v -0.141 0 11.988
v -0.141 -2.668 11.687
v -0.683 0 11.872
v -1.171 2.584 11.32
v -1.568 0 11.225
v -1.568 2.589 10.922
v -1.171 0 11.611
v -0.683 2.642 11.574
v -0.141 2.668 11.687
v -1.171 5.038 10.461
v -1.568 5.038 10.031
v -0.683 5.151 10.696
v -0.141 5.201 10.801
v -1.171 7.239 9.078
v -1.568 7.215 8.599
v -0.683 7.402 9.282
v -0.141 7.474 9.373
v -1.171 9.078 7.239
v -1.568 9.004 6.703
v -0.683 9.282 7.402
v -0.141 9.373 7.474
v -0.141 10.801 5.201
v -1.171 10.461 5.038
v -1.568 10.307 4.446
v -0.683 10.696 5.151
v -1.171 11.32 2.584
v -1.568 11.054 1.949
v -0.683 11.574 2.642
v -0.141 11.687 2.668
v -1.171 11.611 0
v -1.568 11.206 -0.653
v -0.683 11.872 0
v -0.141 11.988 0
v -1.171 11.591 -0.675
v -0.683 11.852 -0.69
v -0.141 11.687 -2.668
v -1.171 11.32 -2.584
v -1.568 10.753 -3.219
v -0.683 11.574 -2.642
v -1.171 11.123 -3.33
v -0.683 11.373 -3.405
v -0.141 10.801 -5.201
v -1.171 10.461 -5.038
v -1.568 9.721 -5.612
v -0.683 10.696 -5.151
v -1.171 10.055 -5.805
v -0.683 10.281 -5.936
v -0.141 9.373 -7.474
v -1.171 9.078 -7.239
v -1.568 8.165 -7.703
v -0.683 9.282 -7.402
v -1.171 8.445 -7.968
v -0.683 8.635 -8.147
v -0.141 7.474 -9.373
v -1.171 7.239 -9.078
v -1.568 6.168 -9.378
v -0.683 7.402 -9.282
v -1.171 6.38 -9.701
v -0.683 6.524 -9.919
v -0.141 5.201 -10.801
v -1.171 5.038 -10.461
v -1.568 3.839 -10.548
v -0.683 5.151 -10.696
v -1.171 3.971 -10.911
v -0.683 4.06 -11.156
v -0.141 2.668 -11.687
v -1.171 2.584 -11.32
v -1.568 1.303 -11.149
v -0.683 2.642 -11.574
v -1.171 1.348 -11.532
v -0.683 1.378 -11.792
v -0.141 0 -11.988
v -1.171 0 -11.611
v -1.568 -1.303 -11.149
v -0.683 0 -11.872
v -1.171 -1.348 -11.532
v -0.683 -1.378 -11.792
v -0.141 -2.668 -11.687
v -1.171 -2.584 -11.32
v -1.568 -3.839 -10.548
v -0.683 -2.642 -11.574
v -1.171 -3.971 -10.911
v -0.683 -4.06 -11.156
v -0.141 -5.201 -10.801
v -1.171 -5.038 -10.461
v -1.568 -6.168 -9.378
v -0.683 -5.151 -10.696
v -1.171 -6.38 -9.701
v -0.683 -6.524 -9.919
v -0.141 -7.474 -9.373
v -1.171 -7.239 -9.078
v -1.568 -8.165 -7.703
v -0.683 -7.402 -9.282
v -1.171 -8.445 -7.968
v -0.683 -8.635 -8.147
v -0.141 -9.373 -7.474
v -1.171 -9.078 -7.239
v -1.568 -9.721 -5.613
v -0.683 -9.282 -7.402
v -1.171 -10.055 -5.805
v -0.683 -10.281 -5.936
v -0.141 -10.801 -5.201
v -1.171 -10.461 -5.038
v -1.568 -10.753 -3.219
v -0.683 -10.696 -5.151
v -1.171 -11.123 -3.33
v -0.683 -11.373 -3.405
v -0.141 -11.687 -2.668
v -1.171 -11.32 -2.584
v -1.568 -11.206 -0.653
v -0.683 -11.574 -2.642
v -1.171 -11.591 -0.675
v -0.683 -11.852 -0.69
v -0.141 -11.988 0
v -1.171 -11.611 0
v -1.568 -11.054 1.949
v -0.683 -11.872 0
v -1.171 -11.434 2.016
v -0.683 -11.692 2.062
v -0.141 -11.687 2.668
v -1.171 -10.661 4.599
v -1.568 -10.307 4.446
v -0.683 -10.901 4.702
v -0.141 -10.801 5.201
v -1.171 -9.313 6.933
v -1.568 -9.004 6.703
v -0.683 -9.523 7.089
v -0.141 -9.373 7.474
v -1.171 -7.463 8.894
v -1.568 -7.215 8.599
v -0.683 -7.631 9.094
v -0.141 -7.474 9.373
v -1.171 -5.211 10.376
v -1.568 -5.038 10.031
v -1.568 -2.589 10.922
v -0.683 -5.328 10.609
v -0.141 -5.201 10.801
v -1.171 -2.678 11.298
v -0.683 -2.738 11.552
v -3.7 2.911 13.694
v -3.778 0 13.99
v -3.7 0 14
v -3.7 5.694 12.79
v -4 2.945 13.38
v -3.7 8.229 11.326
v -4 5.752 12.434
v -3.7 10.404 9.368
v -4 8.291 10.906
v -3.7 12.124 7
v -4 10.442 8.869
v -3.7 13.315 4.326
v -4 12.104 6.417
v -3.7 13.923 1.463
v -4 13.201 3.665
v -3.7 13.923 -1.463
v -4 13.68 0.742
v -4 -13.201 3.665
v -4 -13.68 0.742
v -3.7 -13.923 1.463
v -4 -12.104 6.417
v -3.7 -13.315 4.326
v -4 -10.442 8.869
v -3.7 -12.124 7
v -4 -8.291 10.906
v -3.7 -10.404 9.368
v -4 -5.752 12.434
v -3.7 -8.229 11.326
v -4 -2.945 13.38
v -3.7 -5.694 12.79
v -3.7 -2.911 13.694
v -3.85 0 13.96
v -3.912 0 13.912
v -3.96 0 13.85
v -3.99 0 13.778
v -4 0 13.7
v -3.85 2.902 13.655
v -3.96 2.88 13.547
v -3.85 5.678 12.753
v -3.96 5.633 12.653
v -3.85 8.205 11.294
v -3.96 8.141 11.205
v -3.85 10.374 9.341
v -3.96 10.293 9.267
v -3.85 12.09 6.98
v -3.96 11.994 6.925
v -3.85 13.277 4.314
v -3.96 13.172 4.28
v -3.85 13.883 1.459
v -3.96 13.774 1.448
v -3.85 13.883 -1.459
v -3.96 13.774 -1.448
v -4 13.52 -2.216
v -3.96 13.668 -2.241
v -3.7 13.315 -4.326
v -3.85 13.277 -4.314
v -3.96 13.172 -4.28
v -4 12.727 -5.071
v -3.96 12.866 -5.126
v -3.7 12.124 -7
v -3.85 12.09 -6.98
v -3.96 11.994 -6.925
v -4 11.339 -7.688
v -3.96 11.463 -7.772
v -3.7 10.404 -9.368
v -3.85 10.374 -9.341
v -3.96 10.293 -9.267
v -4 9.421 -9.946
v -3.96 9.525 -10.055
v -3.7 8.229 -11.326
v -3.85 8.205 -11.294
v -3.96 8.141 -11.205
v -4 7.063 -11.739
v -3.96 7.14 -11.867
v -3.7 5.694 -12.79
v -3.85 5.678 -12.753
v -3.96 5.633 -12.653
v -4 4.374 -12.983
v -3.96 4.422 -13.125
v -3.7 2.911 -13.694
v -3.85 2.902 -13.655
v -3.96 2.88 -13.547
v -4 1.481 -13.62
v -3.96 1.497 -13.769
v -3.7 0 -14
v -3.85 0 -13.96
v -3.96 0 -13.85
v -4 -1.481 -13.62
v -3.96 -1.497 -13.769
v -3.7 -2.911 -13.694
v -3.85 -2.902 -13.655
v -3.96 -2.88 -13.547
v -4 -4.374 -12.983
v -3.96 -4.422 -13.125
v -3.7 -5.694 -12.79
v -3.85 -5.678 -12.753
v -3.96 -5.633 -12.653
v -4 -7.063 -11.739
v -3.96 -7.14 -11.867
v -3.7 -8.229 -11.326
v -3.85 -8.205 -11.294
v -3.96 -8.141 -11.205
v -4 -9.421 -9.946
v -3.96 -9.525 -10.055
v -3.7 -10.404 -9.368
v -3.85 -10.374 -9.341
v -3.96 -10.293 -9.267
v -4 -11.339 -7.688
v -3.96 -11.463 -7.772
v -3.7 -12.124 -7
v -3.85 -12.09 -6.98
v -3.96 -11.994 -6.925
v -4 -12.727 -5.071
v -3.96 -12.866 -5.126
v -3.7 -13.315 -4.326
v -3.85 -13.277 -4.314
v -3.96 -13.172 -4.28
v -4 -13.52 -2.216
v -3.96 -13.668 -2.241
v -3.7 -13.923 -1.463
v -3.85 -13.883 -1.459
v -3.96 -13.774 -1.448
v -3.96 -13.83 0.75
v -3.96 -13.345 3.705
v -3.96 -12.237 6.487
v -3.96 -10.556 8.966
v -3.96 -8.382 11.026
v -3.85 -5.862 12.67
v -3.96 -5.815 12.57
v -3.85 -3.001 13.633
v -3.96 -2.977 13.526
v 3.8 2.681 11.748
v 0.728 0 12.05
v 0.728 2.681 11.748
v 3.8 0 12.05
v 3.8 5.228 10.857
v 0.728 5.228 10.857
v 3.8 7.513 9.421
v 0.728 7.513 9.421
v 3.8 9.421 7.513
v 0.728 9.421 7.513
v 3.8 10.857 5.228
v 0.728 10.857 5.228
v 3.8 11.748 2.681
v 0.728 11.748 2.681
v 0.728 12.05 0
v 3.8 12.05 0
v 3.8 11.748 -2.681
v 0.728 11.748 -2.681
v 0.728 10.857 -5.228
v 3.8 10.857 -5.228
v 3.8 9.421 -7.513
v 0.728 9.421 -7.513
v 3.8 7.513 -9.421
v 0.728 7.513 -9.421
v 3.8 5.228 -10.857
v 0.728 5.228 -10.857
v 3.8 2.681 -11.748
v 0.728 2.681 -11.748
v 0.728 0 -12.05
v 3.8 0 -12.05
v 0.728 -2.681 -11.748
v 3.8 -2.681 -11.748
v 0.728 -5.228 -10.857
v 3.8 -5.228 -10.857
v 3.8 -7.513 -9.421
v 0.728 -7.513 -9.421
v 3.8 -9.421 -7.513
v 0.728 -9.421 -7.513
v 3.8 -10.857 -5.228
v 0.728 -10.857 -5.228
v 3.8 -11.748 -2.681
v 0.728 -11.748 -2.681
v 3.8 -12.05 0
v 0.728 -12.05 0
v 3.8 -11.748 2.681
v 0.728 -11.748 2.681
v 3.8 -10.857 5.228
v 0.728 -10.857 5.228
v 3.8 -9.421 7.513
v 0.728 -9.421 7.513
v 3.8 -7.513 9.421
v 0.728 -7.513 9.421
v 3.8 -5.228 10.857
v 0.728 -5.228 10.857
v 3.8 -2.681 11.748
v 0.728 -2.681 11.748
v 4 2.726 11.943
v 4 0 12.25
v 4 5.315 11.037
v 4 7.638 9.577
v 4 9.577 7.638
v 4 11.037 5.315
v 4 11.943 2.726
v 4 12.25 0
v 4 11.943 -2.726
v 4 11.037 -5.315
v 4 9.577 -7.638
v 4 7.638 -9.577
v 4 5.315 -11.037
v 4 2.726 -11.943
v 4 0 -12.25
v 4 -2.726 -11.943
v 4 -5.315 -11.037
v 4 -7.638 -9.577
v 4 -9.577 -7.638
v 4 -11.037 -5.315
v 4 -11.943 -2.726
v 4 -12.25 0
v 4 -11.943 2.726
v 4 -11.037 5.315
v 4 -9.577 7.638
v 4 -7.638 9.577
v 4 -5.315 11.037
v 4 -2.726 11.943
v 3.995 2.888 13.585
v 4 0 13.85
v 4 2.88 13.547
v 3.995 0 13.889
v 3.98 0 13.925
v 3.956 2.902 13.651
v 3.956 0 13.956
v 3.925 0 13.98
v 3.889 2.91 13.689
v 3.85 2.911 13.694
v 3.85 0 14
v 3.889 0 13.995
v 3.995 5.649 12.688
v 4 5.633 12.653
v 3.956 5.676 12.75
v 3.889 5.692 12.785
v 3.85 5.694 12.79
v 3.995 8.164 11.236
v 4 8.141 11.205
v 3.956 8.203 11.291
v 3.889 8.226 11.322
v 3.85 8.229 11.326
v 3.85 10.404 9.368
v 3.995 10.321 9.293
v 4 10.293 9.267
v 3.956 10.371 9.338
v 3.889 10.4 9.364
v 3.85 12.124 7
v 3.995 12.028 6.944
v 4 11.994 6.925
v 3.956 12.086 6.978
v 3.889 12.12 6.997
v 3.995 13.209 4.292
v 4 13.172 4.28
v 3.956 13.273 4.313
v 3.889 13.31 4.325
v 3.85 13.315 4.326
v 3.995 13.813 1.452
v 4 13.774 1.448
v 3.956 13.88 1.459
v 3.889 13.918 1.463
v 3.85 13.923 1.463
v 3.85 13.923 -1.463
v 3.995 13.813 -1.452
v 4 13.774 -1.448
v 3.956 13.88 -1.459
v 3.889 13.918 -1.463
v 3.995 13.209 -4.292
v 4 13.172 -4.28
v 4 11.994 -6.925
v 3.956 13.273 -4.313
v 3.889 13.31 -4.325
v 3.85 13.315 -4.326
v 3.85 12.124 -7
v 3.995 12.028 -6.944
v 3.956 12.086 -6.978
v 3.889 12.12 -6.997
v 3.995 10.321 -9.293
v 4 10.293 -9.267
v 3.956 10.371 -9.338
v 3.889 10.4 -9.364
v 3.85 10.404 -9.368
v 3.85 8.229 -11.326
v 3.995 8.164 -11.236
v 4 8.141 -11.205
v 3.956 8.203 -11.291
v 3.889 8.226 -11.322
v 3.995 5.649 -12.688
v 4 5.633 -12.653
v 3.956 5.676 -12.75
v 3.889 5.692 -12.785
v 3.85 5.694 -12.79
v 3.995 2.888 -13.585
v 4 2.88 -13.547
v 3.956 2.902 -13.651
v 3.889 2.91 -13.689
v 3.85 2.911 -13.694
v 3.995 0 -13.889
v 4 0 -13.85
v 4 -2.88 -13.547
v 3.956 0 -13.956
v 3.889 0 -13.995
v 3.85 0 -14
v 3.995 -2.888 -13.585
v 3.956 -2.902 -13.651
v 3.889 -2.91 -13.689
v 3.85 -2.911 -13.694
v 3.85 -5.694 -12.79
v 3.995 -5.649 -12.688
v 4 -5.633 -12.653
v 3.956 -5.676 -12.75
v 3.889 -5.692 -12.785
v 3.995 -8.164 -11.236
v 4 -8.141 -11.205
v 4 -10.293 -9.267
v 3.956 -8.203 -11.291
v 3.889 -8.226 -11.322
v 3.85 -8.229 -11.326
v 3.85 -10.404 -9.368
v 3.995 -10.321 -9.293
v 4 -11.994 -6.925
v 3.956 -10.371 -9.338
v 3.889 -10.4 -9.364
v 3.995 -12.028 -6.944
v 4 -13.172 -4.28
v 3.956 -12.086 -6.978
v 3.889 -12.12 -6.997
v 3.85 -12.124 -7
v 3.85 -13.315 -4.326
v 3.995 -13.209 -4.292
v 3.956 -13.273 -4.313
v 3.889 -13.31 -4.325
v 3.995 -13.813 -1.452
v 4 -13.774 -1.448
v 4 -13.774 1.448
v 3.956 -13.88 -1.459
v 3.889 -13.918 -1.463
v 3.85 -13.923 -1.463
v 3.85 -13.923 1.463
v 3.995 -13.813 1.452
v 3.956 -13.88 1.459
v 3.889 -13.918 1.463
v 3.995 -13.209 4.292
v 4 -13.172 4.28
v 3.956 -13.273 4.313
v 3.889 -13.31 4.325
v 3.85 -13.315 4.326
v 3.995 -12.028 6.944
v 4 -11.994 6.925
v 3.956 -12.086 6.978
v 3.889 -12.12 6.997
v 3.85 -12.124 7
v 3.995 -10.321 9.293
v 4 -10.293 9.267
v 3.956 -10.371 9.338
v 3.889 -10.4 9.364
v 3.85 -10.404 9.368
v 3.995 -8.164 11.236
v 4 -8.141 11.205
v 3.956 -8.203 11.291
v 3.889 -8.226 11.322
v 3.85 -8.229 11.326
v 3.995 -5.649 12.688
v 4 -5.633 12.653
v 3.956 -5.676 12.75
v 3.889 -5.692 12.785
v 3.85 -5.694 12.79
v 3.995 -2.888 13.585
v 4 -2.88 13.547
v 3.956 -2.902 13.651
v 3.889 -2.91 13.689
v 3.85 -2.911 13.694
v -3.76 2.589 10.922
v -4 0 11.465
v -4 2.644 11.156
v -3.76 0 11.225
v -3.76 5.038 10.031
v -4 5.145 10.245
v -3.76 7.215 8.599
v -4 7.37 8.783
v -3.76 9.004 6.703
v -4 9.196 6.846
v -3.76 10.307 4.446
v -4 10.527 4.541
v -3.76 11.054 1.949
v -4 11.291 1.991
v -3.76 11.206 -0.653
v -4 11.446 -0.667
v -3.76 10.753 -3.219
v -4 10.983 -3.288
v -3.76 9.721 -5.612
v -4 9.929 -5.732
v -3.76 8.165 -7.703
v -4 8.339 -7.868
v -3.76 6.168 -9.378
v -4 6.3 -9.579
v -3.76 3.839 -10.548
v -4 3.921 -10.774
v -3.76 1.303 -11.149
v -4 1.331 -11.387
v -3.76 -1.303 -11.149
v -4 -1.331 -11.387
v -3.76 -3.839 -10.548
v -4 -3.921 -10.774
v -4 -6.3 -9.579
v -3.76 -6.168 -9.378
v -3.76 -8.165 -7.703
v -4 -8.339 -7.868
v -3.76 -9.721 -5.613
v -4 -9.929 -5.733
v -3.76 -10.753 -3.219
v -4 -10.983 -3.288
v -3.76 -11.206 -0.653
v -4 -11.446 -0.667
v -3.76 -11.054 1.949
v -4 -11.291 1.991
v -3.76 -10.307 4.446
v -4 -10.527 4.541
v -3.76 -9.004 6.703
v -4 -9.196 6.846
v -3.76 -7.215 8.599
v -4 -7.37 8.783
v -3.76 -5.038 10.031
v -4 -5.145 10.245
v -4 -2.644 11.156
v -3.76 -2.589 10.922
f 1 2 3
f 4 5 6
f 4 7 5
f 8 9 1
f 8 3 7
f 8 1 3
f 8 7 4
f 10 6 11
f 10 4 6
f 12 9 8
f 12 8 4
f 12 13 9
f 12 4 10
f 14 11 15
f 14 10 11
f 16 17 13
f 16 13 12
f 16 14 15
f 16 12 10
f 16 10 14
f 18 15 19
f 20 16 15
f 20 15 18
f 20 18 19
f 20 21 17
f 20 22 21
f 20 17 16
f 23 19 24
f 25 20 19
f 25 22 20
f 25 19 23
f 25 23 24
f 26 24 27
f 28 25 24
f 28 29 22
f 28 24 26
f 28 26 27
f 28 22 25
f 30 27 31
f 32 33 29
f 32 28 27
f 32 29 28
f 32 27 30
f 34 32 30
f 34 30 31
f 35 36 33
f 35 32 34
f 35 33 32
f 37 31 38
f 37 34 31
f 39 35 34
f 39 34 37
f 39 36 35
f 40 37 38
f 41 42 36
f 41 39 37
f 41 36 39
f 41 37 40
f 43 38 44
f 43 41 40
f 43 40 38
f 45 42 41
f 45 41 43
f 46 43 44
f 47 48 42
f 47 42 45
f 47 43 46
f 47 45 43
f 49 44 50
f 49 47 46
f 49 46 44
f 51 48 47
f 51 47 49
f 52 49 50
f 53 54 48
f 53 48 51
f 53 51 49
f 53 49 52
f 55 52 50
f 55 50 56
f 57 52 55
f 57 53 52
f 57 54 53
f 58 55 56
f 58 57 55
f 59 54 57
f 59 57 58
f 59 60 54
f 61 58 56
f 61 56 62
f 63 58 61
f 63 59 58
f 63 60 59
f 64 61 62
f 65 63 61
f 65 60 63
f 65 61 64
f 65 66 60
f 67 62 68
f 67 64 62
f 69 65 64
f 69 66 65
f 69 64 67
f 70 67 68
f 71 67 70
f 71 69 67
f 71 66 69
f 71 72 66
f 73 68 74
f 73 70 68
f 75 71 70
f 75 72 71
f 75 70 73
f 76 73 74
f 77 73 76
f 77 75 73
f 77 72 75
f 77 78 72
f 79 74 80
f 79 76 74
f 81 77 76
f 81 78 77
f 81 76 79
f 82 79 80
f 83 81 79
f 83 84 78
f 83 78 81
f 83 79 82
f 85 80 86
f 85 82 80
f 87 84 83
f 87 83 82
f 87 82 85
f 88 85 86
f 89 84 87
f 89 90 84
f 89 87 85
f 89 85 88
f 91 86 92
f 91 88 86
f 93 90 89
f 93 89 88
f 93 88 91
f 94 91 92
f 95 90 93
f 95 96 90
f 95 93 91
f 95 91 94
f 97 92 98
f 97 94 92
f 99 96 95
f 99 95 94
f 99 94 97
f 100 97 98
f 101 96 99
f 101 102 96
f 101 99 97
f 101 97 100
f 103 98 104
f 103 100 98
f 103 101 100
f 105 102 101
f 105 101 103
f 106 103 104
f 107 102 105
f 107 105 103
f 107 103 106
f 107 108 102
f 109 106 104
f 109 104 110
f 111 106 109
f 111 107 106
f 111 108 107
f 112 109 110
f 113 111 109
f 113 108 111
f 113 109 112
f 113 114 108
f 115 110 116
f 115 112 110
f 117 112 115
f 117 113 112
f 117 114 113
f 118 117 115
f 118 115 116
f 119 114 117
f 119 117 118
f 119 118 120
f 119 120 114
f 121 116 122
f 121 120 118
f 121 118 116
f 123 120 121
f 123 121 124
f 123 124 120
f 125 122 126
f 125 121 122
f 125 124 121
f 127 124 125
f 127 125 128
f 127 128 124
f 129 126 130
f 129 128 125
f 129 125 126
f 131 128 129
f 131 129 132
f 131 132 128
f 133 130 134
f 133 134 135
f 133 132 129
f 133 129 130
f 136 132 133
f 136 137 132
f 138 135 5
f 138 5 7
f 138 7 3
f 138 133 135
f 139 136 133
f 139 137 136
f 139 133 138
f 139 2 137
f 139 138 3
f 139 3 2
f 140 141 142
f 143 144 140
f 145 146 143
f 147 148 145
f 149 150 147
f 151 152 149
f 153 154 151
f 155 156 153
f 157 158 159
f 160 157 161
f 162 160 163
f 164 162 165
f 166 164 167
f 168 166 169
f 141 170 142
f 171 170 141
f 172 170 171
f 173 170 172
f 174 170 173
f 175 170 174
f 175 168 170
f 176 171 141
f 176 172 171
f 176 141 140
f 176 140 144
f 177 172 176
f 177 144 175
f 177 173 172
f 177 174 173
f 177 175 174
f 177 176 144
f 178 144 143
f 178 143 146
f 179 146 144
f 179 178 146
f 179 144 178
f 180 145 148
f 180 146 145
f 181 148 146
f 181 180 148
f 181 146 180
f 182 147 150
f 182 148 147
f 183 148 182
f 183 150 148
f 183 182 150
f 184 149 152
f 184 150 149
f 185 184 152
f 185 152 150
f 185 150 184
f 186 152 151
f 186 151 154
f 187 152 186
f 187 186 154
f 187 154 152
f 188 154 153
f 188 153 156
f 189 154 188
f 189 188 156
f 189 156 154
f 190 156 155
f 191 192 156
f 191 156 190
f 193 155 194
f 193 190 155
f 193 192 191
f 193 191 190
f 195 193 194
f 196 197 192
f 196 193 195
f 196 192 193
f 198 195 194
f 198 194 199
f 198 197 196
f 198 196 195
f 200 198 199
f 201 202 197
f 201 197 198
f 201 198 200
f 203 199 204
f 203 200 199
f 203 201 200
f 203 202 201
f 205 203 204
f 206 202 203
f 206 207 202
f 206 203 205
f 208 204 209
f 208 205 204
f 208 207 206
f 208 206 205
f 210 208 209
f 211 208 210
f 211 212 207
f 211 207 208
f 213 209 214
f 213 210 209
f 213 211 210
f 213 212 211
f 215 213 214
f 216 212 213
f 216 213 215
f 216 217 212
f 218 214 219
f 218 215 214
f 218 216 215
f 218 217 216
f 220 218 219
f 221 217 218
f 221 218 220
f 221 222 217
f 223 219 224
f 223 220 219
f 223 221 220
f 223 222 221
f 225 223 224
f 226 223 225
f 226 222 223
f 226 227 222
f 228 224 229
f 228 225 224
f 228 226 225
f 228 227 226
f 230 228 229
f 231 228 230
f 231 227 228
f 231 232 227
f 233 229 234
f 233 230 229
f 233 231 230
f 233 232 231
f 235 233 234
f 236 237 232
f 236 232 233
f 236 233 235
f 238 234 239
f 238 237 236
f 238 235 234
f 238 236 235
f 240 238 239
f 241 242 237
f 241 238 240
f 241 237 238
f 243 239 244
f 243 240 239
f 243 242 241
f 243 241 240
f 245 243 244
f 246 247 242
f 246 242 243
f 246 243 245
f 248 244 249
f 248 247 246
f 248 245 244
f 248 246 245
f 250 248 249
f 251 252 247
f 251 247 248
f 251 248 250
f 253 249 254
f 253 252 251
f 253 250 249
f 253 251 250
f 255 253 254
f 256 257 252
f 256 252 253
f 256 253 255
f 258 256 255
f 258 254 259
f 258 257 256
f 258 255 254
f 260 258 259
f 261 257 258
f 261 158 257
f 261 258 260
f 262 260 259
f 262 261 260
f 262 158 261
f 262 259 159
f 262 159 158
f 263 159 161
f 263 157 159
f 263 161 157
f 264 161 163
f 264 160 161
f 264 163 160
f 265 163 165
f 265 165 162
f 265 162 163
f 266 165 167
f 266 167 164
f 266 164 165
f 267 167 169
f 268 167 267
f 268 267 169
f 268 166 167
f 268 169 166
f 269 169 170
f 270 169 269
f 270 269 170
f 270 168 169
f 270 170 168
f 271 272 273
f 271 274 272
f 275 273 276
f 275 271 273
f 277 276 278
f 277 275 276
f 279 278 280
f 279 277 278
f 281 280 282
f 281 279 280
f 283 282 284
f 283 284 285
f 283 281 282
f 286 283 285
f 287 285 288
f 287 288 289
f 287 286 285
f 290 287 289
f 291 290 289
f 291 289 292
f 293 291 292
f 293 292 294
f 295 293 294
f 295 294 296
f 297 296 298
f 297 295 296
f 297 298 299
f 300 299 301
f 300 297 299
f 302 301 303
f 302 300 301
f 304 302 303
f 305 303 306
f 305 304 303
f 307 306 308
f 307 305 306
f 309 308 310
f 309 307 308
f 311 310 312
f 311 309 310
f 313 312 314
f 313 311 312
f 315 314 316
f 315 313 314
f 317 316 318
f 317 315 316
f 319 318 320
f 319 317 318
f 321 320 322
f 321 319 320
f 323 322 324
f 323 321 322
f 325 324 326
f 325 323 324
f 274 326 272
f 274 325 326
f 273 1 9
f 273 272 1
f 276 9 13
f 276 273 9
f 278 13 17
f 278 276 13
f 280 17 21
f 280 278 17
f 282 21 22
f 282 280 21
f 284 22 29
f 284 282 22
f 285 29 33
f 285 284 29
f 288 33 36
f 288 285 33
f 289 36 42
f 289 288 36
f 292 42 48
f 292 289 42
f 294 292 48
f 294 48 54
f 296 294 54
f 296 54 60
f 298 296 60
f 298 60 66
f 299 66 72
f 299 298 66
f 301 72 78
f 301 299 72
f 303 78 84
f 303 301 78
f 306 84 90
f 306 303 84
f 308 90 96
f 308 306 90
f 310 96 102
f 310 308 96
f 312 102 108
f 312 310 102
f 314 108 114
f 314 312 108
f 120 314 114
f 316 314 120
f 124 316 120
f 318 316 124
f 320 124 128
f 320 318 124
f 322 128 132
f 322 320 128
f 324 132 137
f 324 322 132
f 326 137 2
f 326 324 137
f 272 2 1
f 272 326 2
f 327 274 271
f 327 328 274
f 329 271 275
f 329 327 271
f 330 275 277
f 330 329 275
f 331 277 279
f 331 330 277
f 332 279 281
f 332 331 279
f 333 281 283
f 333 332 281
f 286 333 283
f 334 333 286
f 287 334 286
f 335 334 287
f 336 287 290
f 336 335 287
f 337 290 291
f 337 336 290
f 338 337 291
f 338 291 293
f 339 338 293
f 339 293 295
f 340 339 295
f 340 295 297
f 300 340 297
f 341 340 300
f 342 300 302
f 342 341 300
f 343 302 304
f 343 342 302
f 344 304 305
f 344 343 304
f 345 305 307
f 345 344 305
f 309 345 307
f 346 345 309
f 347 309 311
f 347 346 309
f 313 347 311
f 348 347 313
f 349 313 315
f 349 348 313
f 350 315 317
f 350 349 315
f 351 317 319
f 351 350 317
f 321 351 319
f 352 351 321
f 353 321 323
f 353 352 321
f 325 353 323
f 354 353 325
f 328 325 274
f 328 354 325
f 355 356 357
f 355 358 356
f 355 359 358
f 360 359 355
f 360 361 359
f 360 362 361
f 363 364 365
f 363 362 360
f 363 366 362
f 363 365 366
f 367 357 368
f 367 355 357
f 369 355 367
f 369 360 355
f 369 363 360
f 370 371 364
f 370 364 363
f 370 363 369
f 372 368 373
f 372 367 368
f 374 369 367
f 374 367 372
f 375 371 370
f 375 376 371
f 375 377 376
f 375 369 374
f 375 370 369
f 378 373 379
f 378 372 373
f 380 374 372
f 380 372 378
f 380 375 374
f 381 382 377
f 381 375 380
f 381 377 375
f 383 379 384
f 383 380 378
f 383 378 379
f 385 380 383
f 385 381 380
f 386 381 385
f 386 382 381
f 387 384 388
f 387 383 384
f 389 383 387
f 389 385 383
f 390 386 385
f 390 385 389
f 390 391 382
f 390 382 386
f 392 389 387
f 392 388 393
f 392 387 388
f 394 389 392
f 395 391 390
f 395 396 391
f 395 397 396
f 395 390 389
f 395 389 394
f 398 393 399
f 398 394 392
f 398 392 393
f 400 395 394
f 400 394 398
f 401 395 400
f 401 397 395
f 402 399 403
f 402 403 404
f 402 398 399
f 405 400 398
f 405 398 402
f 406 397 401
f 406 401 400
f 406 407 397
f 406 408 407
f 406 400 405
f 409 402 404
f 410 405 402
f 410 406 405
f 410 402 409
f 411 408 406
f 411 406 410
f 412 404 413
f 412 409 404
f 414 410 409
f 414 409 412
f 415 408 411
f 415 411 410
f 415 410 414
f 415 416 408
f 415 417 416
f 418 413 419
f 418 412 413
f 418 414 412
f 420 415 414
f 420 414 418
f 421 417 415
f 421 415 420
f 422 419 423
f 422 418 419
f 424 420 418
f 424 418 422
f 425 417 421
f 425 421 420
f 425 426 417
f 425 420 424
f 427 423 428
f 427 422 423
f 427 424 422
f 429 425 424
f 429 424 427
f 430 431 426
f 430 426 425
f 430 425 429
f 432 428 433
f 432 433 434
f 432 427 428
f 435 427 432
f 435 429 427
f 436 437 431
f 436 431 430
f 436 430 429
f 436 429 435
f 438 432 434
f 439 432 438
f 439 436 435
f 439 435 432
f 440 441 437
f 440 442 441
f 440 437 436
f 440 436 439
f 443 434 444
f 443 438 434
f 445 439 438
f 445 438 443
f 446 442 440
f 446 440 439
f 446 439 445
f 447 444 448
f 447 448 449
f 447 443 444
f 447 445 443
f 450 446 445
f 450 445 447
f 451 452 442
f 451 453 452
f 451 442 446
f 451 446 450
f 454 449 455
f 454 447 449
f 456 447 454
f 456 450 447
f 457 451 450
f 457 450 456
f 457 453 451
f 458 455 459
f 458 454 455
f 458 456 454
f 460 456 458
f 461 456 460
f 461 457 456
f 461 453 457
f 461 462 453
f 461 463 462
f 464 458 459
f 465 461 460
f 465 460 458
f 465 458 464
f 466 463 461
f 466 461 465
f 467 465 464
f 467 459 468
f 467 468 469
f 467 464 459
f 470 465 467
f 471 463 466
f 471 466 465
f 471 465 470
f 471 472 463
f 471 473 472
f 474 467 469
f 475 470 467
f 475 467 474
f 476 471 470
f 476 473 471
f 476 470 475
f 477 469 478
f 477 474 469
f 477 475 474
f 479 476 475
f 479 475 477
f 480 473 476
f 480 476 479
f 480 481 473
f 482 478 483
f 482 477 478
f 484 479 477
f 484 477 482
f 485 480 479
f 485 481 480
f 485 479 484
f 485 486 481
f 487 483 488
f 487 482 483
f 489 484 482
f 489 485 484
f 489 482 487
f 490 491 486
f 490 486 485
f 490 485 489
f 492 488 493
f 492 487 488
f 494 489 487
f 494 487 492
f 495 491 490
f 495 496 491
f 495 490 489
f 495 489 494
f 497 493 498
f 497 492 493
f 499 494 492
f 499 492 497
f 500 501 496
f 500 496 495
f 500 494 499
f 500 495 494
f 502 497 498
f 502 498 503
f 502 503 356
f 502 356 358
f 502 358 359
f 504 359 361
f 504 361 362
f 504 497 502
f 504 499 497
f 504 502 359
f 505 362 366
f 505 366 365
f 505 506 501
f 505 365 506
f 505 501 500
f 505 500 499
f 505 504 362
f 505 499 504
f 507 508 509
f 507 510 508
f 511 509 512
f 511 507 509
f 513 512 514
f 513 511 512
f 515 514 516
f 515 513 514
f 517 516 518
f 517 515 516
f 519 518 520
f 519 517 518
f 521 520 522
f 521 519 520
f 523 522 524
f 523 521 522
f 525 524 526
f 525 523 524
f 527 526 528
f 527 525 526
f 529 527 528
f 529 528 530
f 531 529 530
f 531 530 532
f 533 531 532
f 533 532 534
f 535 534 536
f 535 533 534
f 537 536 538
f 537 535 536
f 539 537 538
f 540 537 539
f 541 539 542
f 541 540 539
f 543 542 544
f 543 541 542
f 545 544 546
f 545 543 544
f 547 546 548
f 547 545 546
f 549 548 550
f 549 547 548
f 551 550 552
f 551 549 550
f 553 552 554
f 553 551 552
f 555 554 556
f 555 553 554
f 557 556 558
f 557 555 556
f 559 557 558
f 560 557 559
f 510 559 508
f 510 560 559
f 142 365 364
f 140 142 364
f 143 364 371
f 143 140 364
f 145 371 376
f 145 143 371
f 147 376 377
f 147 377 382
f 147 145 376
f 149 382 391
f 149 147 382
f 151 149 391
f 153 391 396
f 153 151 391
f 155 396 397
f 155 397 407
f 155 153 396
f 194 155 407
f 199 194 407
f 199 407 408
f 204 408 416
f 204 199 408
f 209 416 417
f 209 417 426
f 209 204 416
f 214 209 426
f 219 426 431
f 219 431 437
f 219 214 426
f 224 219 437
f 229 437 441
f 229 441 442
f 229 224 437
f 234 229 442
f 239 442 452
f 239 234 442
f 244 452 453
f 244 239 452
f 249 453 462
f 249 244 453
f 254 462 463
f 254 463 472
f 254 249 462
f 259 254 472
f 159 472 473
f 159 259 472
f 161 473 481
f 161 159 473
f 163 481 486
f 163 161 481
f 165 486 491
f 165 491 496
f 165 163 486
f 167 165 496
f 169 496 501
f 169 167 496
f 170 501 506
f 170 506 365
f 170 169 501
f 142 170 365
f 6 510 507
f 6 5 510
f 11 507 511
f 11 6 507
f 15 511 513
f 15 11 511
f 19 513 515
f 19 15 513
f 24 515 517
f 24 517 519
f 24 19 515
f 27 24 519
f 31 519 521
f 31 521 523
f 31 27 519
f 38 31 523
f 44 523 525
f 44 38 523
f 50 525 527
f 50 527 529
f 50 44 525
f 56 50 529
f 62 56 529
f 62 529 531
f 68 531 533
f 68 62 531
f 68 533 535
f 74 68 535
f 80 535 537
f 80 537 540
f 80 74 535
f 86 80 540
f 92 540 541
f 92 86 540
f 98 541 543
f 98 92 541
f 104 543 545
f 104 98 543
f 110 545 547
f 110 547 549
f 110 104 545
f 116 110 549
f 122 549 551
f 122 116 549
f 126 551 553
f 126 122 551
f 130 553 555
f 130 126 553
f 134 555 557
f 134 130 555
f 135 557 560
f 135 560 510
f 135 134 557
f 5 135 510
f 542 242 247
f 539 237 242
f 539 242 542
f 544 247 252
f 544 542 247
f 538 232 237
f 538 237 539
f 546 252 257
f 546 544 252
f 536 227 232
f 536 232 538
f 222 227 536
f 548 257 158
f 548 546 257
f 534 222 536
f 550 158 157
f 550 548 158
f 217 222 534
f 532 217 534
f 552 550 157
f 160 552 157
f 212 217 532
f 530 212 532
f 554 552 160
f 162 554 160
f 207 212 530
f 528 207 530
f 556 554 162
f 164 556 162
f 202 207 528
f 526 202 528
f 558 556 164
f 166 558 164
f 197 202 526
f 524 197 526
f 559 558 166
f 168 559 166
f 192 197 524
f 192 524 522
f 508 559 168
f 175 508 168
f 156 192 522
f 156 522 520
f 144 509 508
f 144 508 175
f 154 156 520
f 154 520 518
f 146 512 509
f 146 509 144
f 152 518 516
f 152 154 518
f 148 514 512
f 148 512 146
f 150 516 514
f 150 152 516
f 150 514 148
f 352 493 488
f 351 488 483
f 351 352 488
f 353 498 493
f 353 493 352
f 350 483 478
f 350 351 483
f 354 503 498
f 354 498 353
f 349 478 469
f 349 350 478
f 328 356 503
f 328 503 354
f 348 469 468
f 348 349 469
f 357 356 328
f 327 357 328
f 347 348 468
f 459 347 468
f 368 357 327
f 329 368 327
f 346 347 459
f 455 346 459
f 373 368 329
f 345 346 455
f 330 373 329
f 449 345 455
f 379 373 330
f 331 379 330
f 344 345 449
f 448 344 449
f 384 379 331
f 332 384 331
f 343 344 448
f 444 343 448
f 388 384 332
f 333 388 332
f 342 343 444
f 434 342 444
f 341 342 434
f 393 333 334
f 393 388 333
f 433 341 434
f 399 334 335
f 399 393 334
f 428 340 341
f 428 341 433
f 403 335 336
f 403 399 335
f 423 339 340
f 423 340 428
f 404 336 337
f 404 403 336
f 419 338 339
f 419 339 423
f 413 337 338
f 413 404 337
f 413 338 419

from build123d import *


with BuildPart() as part:
    # Sketch1 → Revolve1 (revolve)
    with BuildSketch(Plane.XY, mode=Mode.PRIVATE) as revolve1_sk:
        with BuildLine():
            Line((-4, 11.465), (-3.76, 11.225))
            Line((-3.76, 11.225), (-1.567918365, 11.225))
            ThreePointArc((-1.567918365, 11.225), (-0.935852777, 11.758477094), (-0.141221865, 11.987968776))
            Line((-0.141221865, 11.987968776), (0.728253065, 12.05))
            Line((0.728253065, 12.05), (3.8, 12.05))
            Line((3.8, 12.05), (4, 12.25))
            Line((4, 12.25), (4, 13.85))
            ThreePointArc((4, 13.85), (3.956066017, 13.956066017), (3.85, 14))
            Line((3.85, 14), (-3.7, 14))
            ThreePointArc((-3.7, 14), (-3.912132034, 13.912132034), (-4, 13.7))
            Line((-4, 13.7), (-4, 11.465))
        make_face()
    revolve(revolve1_sk.sketch.rotate(Axis((4, 0, 0), (-1, 0, 0)), 270), axis=Axis((4, 0, 0), (-1, 0, 0)))


solid = part.part
